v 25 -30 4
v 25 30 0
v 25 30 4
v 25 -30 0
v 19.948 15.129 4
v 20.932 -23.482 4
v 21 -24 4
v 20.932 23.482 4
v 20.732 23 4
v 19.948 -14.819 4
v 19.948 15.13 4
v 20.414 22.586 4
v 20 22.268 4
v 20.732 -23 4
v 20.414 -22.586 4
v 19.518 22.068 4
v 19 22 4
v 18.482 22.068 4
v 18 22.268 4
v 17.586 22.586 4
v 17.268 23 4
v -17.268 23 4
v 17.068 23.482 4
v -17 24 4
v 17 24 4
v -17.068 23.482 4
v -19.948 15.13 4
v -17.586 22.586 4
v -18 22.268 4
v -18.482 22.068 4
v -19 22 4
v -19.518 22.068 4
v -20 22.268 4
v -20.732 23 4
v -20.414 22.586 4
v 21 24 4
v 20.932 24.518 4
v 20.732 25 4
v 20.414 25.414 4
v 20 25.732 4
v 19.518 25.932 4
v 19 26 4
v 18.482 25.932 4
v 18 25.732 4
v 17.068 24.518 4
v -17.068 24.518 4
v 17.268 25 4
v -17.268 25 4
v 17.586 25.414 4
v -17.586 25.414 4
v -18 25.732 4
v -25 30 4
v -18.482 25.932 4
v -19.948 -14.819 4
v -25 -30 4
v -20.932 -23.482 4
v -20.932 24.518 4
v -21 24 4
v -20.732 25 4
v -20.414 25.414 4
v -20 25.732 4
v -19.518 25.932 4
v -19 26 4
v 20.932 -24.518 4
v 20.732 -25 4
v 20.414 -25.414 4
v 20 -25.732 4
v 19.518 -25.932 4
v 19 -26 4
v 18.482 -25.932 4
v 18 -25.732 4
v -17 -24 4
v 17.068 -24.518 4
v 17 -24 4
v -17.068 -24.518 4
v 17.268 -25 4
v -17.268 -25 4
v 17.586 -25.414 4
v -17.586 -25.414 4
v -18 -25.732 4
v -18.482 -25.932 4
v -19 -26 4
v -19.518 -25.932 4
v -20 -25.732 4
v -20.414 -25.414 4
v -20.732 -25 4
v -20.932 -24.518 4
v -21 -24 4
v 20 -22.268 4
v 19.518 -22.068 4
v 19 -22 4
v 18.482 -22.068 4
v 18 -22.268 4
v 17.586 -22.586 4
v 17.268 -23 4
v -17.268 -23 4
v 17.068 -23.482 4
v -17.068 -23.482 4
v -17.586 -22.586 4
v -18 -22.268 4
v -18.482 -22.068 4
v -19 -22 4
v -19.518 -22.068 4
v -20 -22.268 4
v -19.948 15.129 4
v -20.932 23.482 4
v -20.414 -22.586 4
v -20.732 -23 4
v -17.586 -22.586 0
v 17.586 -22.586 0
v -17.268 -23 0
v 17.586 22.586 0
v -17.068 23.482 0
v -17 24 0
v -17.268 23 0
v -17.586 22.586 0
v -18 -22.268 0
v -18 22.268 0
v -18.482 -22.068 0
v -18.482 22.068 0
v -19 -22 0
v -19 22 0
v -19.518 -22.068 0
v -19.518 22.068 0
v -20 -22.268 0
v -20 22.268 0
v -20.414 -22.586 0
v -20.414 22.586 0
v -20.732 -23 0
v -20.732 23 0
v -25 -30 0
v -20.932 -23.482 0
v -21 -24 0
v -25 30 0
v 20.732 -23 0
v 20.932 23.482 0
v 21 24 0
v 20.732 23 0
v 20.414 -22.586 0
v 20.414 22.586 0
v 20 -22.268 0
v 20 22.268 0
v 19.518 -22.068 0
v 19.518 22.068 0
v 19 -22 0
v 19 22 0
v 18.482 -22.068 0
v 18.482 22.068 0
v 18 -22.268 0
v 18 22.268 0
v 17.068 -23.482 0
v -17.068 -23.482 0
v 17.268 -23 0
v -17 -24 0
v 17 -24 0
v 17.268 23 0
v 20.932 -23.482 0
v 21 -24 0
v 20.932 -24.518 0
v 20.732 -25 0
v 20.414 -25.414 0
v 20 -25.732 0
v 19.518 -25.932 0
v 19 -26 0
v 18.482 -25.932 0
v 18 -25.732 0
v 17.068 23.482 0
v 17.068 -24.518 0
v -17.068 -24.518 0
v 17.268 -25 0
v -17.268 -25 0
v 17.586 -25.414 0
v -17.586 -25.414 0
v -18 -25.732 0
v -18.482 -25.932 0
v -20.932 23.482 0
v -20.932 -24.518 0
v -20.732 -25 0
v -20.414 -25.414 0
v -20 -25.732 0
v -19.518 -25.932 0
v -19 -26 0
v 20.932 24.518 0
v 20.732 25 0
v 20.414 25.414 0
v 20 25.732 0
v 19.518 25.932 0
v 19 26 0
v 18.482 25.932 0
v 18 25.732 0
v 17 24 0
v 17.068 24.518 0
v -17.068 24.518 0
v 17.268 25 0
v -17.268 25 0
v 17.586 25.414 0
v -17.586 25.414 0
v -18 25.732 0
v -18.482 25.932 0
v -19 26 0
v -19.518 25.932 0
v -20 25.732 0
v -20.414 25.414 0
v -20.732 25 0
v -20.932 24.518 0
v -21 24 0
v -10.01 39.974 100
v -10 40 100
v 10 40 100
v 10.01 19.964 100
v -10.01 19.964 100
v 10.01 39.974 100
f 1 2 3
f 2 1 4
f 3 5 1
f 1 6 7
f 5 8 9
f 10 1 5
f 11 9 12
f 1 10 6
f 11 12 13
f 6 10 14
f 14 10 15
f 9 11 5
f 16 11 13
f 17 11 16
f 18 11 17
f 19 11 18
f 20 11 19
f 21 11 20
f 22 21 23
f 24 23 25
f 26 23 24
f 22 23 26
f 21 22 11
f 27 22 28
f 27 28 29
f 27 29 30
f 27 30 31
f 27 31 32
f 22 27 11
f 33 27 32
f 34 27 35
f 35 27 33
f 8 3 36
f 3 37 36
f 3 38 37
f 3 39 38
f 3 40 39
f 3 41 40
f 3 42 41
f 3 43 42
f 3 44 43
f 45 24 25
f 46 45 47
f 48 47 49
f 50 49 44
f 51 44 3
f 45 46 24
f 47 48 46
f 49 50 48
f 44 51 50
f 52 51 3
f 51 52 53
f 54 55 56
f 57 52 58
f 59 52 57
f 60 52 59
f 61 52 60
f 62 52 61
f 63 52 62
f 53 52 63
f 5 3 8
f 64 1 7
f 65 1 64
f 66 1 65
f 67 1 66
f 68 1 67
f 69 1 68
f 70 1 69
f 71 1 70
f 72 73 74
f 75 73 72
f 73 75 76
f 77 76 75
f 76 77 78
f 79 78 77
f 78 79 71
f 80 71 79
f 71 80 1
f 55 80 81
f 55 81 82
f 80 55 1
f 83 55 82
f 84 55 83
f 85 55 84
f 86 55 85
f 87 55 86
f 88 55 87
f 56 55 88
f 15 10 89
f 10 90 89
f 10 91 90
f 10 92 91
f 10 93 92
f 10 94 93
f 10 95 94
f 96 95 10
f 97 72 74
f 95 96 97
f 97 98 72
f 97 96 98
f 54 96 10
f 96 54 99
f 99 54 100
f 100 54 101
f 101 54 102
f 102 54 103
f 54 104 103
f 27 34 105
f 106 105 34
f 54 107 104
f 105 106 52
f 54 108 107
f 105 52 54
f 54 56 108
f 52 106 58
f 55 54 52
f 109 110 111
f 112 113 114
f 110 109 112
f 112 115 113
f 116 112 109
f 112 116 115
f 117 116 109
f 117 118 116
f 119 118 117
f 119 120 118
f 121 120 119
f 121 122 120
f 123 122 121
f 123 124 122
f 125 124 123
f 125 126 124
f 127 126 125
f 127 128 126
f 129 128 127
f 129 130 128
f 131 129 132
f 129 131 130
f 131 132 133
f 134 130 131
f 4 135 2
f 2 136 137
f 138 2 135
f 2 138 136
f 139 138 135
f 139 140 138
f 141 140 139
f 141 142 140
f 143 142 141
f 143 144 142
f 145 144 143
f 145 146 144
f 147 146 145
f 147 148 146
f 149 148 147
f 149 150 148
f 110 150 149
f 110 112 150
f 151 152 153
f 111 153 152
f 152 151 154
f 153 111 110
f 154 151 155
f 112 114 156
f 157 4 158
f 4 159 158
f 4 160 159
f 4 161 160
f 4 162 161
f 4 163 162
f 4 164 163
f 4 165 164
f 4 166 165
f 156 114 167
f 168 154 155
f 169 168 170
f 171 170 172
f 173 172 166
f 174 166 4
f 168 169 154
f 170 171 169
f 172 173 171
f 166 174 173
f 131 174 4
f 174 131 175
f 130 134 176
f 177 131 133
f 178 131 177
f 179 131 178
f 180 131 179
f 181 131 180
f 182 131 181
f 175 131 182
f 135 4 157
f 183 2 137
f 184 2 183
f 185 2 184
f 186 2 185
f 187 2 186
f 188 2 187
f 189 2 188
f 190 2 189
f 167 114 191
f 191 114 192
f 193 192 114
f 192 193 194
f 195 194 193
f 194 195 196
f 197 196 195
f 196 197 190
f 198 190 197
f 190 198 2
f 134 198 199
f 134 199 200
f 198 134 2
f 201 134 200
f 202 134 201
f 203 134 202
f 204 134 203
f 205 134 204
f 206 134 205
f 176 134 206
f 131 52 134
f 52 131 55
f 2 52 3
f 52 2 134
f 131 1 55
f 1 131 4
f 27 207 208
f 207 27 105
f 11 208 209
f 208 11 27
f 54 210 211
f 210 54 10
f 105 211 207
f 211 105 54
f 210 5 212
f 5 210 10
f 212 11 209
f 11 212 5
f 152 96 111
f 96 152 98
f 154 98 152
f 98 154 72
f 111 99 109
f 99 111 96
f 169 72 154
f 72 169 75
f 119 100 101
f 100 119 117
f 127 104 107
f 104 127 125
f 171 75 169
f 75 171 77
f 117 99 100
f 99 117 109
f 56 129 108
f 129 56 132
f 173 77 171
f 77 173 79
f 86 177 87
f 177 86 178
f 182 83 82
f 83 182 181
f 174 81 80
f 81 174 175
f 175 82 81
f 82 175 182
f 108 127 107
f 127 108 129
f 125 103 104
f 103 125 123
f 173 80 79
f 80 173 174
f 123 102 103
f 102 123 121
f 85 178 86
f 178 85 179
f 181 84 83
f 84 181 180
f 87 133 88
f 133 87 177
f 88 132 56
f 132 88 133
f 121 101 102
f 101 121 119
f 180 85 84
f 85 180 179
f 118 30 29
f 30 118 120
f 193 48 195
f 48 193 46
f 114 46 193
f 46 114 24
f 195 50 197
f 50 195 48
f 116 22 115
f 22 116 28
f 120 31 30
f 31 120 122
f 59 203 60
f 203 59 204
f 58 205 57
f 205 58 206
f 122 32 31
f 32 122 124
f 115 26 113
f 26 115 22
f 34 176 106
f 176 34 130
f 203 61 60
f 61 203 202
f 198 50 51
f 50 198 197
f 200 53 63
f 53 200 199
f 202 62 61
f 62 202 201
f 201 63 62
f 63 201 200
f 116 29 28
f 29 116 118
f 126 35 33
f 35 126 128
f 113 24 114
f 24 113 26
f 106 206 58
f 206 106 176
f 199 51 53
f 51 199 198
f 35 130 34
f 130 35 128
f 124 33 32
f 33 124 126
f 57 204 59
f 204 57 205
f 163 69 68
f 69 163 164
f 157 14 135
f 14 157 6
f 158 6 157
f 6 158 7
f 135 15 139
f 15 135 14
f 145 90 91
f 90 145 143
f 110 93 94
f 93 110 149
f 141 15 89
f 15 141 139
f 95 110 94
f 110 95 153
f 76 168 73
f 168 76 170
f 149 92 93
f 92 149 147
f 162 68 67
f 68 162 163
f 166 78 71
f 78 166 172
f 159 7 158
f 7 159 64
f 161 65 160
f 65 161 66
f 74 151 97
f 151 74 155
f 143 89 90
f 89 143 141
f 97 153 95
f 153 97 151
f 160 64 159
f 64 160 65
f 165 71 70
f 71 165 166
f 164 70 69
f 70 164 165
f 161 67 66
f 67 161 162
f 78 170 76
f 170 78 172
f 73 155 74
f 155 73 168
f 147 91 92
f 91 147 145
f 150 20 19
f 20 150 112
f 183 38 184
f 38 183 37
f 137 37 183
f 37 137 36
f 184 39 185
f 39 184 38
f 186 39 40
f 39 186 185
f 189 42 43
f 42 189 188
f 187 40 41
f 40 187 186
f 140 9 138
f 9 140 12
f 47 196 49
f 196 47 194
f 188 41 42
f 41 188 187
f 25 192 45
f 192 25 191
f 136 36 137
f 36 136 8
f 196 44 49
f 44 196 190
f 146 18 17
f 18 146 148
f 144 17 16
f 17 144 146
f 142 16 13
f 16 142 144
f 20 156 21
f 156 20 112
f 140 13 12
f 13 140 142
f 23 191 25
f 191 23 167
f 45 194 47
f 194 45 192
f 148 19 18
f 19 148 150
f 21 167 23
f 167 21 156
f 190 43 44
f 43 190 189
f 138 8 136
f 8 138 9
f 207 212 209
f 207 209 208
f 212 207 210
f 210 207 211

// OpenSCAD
/**
 * a parameterized model for a furniture leg
 */
plate_thickness = 4; // mm
plate_width_x = 50; // mm
plate_width_y = 60; // mm
leg_width_x_top = 40; // mm
leg_width_y_top = 30; // mm
leg_offset_x = 0; // mm
leg_offset_y = 30; // mm
leg_width_x_bottom = 20; // mm
leg_width_y_bottom = 20; // mm
leg_height = 100; // mm
hole_diameter = 4; // mm

$fn=24;

module bottom(extra) {
  translate([leg_offset_x, leg_offset_y, leg_height + (0.1 + extra) / 2]) {
    cube([leg_width_x_bottom + extra, leg_width_y_bottom + extra, 0.1 + extra], center=true);
  }
}

difference() {
  union() {
    translate([0, 0, plate_thickness / 2]) {
      cube([plate_width_x, plate_width_y, plate_thickness], center=true);
    }
    hull() {
      translate([0, 0, plate_thickness - 0.5]) {
        cube([leg_width_x_top, leg_width_y_top, 0.0001], center=true);
      }
      bottom(0);
    }
  }
  bottom(10);

  for (xd=[-1, 1]) {
    for (yd=[-1, 1]) {
      translate([
          xd * (plate_width_x / 2 - 1.5 * hole_diameter),
          yd * (plate_width_y / 2 - 1.5 * hole_diameter),
          plate_thickness / 2]) {
        cylinder(d=hole_diameter, h=plate_thickness + 0.1, center=true);
      }
    }
  }
}
